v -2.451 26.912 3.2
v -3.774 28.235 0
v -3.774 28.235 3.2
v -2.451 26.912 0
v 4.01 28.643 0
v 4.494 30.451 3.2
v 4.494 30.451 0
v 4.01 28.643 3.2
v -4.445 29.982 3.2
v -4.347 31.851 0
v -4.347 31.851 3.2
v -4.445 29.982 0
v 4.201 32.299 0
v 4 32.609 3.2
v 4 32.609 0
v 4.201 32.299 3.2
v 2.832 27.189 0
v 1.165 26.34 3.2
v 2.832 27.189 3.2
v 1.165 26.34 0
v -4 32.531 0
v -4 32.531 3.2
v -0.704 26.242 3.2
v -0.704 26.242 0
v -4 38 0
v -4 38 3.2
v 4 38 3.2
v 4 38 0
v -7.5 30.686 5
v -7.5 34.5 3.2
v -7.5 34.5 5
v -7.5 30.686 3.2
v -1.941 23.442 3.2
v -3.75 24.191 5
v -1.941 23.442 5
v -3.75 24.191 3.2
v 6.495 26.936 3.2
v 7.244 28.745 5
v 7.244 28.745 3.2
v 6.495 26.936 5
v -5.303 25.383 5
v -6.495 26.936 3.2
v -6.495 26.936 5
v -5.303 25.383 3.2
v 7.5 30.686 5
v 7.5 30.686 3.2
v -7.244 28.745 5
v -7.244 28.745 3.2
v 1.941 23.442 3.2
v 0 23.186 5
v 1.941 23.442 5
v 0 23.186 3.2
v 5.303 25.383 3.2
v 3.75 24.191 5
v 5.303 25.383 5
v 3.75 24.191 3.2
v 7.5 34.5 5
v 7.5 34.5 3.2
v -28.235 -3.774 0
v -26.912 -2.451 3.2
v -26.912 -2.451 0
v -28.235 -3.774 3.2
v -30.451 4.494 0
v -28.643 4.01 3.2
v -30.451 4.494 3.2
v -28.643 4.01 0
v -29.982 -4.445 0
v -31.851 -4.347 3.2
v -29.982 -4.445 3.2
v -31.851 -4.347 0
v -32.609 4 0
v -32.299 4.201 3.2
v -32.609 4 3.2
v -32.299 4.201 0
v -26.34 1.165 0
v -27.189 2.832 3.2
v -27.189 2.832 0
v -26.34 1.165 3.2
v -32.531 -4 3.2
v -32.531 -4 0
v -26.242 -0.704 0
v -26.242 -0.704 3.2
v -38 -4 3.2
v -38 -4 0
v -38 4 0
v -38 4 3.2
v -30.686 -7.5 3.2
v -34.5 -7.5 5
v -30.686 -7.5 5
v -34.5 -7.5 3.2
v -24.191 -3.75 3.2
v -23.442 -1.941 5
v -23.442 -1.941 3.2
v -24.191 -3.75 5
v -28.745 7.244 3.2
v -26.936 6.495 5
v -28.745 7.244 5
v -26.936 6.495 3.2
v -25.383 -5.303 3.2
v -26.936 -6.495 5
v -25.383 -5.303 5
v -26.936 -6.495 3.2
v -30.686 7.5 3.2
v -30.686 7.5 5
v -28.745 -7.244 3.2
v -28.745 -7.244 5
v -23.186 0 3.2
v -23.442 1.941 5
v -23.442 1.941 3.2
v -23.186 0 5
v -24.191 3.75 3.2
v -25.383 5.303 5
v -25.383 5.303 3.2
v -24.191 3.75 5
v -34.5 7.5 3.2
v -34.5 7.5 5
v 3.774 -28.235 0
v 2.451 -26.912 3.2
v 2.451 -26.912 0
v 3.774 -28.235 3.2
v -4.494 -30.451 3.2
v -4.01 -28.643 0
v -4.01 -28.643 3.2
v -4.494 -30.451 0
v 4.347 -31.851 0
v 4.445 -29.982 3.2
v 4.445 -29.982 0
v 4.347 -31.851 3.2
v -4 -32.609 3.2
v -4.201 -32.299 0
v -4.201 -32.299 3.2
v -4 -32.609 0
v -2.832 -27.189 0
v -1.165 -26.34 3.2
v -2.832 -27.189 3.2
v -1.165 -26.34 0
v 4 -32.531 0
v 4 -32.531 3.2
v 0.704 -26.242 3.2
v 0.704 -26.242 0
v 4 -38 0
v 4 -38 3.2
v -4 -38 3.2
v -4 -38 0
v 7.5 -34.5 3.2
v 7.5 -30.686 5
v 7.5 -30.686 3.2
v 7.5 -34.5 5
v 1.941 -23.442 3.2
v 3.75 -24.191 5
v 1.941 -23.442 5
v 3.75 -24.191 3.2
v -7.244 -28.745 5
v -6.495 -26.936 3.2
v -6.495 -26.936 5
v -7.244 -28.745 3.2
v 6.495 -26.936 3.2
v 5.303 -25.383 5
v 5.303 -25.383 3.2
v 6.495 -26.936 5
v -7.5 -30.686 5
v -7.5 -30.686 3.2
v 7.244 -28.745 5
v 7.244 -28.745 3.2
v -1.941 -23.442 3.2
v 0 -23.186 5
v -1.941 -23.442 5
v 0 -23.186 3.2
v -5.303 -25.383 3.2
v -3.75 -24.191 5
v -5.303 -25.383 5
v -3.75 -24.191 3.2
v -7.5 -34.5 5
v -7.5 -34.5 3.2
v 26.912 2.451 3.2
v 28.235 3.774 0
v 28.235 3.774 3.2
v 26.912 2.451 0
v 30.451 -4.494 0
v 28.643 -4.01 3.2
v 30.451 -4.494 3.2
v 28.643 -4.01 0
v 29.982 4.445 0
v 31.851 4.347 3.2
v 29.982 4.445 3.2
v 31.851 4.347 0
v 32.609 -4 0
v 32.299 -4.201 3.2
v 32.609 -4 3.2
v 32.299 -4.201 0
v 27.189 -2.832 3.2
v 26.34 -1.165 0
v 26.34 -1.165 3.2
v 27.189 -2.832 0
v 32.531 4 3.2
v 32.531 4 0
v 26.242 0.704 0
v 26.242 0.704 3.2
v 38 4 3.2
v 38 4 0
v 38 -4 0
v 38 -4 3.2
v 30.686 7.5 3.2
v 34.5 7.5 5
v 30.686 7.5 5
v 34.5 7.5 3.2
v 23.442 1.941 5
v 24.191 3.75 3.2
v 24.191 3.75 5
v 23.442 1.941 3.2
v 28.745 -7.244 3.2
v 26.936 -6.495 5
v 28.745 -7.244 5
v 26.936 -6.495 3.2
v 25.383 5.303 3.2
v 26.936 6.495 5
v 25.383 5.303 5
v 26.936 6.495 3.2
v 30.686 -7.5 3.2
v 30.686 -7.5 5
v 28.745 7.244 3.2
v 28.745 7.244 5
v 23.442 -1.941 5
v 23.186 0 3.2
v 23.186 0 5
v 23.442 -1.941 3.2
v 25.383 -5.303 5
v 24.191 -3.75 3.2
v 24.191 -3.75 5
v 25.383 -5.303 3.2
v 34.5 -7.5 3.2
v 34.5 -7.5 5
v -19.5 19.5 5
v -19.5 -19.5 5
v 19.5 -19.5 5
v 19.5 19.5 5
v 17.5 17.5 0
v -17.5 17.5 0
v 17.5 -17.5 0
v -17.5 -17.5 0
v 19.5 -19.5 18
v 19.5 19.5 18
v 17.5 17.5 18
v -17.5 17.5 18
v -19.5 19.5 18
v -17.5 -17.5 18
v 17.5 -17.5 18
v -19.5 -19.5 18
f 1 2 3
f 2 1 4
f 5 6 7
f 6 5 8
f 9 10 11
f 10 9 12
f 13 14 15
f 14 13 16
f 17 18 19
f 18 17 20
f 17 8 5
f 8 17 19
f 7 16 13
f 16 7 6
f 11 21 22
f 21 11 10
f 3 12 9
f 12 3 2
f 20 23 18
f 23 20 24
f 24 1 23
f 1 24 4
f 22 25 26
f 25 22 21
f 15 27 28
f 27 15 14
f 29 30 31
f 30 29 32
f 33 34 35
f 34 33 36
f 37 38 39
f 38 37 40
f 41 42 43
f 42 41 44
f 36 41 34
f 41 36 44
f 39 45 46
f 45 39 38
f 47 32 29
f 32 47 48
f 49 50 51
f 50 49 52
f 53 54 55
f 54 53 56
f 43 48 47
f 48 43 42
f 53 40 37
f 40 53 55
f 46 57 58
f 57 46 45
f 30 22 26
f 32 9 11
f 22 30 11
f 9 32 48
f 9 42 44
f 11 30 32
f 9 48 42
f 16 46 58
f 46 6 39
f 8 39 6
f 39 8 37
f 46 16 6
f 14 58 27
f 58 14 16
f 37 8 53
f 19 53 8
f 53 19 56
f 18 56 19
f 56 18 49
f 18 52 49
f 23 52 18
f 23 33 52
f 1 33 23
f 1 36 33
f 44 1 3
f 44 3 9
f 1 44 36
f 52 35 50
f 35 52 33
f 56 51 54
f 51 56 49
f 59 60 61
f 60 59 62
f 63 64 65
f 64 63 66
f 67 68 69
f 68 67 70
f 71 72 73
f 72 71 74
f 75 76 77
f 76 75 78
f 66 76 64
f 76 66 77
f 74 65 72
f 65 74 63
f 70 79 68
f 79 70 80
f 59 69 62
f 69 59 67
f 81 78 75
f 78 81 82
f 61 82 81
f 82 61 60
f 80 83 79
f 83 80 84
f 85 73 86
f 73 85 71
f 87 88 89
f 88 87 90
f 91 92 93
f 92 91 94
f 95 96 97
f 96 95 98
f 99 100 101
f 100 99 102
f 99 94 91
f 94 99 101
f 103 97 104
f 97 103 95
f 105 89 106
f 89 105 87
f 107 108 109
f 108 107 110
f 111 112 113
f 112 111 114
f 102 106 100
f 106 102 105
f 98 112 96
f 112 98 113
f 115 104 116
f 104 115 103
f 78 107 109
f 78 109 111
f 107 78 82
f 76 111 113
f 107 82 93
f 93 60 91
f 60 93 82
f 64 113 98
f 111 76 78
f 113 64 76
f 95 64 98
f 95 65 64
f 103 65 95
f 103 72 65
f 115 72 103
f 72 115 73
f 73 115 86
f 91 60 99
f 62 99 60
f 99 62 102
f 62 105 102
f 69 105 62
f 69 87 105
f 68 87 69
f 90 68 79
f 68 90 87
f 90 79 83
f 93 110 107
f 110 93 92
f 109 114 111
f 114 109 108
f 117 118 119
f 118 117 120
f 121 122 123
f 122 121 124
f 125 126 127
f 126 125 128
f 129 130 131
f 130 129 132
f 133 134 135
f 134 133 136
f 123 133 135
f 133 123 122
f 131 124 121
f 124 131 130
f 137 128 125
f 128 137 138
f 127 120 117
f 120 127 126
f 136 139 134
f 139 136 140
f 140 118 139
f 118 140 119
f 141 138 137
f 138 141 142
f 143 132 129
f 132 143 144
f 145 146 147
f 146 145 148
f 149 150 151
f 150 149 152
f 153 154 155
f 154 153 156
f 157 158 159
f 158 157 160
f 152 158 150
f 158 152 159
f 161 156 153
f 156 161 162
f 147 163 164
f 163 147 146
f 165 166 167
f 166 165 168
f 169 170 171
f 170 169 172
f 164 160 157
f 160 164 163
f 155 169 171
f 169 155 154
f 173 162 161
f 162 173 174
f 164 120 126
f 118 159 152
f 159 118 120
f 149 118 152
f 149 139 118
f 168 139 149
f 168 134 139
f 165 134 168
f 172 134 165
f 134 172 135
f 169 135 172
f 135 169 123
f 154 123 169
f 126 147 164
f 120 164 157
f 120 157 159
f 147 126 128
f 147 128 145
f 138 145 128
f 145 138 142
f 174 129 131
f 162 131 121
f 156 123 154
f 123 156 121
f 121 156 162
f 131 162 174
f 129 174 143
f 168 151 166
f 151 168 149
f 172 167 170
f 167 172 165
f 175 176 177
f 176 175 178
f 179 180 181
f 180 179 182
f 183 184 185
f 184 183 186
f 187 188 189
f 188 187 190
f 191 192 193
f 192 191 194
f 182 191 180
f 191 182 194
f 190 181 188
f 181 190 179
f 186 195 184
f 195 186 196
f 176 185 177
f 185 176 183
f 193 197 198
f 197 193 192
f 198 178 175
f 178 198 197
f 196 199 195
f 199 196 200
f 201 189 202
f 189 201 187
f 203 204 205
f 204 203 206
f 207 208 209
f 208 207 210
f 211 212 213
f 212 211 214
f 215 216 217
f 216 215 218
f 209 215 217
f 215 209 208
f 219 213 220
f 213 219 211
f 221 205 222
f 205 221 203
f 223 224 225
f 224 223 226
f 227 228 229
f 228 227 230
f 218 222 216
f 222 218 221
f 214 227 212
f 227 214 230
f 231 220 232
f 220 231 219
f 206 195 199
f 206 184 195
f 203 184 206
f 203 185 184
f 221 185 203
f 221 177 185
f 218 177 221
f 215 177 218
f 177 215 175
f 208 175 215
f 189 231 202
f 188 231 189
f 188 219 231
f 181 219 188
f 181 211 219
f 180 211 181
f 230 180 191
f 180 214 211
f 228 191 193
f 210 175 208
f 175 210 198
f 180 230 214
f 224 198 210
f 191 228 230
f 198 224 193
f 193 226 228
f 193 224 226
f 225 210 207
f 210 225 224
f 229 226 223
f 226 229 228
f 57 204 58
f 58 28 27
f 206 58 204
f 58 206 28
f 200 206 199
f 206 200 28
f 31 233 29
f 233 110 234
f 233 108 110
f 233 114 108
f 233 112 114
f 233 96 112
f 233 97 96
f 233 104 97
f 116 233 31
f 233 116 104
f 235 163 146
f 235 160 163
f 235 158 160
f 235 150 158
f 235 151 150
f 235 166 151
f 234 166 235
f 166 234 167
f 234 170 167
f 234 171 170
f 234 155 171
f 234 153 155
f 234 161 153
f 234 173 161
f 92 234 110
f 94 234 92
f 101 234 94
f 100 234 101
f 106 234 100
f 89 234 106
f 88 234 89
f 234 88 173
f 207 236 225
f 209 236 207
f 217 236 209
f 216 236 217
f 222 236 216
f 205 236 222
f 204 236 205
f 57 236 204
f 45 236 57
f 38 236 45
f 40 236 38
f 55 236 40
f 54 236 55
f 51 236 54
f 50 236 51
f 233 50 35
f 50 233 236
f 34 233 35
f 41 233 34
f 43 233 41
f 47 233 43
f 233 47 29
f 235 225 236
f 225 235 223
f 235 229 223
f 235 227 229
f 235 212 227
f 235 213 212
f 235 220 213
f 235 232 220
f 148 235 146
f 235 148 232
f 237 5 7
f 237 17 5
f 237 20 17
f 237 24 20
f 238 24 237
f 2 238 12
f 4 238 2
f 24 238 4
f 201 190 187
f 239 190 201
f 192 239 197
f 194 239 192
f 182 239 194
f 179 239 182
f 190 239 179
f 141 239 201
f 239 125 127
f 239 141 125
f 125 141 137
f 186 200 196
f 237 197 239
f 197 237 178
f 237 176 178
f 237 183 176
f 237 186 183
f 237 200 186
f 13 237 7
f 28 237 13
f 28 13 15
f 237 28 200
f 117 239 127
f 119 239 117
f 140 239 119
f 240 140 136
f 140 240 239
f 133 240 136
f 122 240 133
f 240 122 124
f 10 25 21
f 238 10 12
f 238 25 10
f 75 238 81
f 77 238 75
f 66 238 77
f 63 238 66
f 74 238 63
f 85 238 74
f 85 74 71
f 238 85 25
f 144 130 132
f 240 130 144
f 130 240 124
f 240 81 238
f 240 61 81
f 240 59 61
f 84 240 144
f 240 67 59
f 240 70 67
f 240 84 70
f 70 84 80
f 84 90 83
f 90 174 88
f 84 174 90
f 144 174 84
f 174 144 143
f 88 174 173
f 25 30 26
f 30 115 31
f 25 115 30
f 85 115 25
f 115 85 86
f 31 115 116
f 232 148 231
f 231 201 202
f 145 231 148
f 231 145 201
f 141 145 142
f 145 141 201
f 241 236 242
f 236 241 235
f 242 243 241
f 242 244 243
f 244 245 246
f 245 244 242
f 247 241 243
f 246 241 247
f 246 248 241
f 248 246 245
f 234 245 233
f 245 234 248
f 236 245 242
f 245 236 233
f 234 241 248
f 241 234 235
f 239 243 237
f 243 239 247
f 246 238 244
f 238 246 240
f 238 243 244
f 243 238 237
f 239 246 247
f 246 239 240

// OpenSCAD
motor_d = 35;
wall_t = 2;
wall_h = 18;
base_h = 5;
base_d= 1.2 * sqrt(2) * motor_d;

sucker_neck_d = 9;
sucker_slot_d = 8;
sucker_neck_h = 3.2;
sucker_head_d = 15;

sucker_pos = 8;
e = 0.1;
e2 = 2*e;

module oval_hole(z_off, h,d,s) {
                translate([0,0,z_off + h/2]) {
                hull() {
                    cylinder(d=d, center=true, h=h);
                    translate([ d, d, 0]) {
                        cylinder(d=d, center=true, h=h);
                    }
                }
               
            }

        }
module sucker_hole() {
    // translate to sucker vertical axis
    offset = base_d/2 - sucker_pos;
    translate([offset,offset,0]) {
        union() {
            // space for the sucker head
            oval_hole(sucker_neck_h, base_h - sucker_neck_h + e, sucker_head_d, sucker_head_d);
            // sucker neck hole & slot
            translate([0,0,-e]) {
                // hole
                cylinder(d=sucker_neck_d, h=sucker_neck_h+e2, center=false);
                // slot
                rotate(a=45) {
                    translate([0,-sucker_slot_d/2,0]) {
                        cube(size=[100,sucker_slot_d,sucker_neck_h+e2]);
                    }
                }
            }
        }
    }
}

module base() {
    difference() {
        translate([0,0,base_h/2]) {
            cube(center = true, 
                size=[base_d, base_d,base_h]);
        }
        for(x=[0:90:270]) {
            rotate (a=x) {
                sucker_hole();
            }
        }
    }
}

module walls() {
    wall_size = motor_d + 2*wall_t;

    translate([0,0,wall_h/2]) {
        cube(center = true, 
             size=[wall_size, wall_size, wall_h]);
    }    
}

module motor_hole() {
    translate([0,0,wall_h/2]) {
        cube(center = true, 
             size=[motor_d, motor_d, wall_h+e2]);
    }        
}

difference() {
    union() {
        walls();
        rotate(a=45) {
            base();
        }
        
    }
    motor_hole();
}
    
